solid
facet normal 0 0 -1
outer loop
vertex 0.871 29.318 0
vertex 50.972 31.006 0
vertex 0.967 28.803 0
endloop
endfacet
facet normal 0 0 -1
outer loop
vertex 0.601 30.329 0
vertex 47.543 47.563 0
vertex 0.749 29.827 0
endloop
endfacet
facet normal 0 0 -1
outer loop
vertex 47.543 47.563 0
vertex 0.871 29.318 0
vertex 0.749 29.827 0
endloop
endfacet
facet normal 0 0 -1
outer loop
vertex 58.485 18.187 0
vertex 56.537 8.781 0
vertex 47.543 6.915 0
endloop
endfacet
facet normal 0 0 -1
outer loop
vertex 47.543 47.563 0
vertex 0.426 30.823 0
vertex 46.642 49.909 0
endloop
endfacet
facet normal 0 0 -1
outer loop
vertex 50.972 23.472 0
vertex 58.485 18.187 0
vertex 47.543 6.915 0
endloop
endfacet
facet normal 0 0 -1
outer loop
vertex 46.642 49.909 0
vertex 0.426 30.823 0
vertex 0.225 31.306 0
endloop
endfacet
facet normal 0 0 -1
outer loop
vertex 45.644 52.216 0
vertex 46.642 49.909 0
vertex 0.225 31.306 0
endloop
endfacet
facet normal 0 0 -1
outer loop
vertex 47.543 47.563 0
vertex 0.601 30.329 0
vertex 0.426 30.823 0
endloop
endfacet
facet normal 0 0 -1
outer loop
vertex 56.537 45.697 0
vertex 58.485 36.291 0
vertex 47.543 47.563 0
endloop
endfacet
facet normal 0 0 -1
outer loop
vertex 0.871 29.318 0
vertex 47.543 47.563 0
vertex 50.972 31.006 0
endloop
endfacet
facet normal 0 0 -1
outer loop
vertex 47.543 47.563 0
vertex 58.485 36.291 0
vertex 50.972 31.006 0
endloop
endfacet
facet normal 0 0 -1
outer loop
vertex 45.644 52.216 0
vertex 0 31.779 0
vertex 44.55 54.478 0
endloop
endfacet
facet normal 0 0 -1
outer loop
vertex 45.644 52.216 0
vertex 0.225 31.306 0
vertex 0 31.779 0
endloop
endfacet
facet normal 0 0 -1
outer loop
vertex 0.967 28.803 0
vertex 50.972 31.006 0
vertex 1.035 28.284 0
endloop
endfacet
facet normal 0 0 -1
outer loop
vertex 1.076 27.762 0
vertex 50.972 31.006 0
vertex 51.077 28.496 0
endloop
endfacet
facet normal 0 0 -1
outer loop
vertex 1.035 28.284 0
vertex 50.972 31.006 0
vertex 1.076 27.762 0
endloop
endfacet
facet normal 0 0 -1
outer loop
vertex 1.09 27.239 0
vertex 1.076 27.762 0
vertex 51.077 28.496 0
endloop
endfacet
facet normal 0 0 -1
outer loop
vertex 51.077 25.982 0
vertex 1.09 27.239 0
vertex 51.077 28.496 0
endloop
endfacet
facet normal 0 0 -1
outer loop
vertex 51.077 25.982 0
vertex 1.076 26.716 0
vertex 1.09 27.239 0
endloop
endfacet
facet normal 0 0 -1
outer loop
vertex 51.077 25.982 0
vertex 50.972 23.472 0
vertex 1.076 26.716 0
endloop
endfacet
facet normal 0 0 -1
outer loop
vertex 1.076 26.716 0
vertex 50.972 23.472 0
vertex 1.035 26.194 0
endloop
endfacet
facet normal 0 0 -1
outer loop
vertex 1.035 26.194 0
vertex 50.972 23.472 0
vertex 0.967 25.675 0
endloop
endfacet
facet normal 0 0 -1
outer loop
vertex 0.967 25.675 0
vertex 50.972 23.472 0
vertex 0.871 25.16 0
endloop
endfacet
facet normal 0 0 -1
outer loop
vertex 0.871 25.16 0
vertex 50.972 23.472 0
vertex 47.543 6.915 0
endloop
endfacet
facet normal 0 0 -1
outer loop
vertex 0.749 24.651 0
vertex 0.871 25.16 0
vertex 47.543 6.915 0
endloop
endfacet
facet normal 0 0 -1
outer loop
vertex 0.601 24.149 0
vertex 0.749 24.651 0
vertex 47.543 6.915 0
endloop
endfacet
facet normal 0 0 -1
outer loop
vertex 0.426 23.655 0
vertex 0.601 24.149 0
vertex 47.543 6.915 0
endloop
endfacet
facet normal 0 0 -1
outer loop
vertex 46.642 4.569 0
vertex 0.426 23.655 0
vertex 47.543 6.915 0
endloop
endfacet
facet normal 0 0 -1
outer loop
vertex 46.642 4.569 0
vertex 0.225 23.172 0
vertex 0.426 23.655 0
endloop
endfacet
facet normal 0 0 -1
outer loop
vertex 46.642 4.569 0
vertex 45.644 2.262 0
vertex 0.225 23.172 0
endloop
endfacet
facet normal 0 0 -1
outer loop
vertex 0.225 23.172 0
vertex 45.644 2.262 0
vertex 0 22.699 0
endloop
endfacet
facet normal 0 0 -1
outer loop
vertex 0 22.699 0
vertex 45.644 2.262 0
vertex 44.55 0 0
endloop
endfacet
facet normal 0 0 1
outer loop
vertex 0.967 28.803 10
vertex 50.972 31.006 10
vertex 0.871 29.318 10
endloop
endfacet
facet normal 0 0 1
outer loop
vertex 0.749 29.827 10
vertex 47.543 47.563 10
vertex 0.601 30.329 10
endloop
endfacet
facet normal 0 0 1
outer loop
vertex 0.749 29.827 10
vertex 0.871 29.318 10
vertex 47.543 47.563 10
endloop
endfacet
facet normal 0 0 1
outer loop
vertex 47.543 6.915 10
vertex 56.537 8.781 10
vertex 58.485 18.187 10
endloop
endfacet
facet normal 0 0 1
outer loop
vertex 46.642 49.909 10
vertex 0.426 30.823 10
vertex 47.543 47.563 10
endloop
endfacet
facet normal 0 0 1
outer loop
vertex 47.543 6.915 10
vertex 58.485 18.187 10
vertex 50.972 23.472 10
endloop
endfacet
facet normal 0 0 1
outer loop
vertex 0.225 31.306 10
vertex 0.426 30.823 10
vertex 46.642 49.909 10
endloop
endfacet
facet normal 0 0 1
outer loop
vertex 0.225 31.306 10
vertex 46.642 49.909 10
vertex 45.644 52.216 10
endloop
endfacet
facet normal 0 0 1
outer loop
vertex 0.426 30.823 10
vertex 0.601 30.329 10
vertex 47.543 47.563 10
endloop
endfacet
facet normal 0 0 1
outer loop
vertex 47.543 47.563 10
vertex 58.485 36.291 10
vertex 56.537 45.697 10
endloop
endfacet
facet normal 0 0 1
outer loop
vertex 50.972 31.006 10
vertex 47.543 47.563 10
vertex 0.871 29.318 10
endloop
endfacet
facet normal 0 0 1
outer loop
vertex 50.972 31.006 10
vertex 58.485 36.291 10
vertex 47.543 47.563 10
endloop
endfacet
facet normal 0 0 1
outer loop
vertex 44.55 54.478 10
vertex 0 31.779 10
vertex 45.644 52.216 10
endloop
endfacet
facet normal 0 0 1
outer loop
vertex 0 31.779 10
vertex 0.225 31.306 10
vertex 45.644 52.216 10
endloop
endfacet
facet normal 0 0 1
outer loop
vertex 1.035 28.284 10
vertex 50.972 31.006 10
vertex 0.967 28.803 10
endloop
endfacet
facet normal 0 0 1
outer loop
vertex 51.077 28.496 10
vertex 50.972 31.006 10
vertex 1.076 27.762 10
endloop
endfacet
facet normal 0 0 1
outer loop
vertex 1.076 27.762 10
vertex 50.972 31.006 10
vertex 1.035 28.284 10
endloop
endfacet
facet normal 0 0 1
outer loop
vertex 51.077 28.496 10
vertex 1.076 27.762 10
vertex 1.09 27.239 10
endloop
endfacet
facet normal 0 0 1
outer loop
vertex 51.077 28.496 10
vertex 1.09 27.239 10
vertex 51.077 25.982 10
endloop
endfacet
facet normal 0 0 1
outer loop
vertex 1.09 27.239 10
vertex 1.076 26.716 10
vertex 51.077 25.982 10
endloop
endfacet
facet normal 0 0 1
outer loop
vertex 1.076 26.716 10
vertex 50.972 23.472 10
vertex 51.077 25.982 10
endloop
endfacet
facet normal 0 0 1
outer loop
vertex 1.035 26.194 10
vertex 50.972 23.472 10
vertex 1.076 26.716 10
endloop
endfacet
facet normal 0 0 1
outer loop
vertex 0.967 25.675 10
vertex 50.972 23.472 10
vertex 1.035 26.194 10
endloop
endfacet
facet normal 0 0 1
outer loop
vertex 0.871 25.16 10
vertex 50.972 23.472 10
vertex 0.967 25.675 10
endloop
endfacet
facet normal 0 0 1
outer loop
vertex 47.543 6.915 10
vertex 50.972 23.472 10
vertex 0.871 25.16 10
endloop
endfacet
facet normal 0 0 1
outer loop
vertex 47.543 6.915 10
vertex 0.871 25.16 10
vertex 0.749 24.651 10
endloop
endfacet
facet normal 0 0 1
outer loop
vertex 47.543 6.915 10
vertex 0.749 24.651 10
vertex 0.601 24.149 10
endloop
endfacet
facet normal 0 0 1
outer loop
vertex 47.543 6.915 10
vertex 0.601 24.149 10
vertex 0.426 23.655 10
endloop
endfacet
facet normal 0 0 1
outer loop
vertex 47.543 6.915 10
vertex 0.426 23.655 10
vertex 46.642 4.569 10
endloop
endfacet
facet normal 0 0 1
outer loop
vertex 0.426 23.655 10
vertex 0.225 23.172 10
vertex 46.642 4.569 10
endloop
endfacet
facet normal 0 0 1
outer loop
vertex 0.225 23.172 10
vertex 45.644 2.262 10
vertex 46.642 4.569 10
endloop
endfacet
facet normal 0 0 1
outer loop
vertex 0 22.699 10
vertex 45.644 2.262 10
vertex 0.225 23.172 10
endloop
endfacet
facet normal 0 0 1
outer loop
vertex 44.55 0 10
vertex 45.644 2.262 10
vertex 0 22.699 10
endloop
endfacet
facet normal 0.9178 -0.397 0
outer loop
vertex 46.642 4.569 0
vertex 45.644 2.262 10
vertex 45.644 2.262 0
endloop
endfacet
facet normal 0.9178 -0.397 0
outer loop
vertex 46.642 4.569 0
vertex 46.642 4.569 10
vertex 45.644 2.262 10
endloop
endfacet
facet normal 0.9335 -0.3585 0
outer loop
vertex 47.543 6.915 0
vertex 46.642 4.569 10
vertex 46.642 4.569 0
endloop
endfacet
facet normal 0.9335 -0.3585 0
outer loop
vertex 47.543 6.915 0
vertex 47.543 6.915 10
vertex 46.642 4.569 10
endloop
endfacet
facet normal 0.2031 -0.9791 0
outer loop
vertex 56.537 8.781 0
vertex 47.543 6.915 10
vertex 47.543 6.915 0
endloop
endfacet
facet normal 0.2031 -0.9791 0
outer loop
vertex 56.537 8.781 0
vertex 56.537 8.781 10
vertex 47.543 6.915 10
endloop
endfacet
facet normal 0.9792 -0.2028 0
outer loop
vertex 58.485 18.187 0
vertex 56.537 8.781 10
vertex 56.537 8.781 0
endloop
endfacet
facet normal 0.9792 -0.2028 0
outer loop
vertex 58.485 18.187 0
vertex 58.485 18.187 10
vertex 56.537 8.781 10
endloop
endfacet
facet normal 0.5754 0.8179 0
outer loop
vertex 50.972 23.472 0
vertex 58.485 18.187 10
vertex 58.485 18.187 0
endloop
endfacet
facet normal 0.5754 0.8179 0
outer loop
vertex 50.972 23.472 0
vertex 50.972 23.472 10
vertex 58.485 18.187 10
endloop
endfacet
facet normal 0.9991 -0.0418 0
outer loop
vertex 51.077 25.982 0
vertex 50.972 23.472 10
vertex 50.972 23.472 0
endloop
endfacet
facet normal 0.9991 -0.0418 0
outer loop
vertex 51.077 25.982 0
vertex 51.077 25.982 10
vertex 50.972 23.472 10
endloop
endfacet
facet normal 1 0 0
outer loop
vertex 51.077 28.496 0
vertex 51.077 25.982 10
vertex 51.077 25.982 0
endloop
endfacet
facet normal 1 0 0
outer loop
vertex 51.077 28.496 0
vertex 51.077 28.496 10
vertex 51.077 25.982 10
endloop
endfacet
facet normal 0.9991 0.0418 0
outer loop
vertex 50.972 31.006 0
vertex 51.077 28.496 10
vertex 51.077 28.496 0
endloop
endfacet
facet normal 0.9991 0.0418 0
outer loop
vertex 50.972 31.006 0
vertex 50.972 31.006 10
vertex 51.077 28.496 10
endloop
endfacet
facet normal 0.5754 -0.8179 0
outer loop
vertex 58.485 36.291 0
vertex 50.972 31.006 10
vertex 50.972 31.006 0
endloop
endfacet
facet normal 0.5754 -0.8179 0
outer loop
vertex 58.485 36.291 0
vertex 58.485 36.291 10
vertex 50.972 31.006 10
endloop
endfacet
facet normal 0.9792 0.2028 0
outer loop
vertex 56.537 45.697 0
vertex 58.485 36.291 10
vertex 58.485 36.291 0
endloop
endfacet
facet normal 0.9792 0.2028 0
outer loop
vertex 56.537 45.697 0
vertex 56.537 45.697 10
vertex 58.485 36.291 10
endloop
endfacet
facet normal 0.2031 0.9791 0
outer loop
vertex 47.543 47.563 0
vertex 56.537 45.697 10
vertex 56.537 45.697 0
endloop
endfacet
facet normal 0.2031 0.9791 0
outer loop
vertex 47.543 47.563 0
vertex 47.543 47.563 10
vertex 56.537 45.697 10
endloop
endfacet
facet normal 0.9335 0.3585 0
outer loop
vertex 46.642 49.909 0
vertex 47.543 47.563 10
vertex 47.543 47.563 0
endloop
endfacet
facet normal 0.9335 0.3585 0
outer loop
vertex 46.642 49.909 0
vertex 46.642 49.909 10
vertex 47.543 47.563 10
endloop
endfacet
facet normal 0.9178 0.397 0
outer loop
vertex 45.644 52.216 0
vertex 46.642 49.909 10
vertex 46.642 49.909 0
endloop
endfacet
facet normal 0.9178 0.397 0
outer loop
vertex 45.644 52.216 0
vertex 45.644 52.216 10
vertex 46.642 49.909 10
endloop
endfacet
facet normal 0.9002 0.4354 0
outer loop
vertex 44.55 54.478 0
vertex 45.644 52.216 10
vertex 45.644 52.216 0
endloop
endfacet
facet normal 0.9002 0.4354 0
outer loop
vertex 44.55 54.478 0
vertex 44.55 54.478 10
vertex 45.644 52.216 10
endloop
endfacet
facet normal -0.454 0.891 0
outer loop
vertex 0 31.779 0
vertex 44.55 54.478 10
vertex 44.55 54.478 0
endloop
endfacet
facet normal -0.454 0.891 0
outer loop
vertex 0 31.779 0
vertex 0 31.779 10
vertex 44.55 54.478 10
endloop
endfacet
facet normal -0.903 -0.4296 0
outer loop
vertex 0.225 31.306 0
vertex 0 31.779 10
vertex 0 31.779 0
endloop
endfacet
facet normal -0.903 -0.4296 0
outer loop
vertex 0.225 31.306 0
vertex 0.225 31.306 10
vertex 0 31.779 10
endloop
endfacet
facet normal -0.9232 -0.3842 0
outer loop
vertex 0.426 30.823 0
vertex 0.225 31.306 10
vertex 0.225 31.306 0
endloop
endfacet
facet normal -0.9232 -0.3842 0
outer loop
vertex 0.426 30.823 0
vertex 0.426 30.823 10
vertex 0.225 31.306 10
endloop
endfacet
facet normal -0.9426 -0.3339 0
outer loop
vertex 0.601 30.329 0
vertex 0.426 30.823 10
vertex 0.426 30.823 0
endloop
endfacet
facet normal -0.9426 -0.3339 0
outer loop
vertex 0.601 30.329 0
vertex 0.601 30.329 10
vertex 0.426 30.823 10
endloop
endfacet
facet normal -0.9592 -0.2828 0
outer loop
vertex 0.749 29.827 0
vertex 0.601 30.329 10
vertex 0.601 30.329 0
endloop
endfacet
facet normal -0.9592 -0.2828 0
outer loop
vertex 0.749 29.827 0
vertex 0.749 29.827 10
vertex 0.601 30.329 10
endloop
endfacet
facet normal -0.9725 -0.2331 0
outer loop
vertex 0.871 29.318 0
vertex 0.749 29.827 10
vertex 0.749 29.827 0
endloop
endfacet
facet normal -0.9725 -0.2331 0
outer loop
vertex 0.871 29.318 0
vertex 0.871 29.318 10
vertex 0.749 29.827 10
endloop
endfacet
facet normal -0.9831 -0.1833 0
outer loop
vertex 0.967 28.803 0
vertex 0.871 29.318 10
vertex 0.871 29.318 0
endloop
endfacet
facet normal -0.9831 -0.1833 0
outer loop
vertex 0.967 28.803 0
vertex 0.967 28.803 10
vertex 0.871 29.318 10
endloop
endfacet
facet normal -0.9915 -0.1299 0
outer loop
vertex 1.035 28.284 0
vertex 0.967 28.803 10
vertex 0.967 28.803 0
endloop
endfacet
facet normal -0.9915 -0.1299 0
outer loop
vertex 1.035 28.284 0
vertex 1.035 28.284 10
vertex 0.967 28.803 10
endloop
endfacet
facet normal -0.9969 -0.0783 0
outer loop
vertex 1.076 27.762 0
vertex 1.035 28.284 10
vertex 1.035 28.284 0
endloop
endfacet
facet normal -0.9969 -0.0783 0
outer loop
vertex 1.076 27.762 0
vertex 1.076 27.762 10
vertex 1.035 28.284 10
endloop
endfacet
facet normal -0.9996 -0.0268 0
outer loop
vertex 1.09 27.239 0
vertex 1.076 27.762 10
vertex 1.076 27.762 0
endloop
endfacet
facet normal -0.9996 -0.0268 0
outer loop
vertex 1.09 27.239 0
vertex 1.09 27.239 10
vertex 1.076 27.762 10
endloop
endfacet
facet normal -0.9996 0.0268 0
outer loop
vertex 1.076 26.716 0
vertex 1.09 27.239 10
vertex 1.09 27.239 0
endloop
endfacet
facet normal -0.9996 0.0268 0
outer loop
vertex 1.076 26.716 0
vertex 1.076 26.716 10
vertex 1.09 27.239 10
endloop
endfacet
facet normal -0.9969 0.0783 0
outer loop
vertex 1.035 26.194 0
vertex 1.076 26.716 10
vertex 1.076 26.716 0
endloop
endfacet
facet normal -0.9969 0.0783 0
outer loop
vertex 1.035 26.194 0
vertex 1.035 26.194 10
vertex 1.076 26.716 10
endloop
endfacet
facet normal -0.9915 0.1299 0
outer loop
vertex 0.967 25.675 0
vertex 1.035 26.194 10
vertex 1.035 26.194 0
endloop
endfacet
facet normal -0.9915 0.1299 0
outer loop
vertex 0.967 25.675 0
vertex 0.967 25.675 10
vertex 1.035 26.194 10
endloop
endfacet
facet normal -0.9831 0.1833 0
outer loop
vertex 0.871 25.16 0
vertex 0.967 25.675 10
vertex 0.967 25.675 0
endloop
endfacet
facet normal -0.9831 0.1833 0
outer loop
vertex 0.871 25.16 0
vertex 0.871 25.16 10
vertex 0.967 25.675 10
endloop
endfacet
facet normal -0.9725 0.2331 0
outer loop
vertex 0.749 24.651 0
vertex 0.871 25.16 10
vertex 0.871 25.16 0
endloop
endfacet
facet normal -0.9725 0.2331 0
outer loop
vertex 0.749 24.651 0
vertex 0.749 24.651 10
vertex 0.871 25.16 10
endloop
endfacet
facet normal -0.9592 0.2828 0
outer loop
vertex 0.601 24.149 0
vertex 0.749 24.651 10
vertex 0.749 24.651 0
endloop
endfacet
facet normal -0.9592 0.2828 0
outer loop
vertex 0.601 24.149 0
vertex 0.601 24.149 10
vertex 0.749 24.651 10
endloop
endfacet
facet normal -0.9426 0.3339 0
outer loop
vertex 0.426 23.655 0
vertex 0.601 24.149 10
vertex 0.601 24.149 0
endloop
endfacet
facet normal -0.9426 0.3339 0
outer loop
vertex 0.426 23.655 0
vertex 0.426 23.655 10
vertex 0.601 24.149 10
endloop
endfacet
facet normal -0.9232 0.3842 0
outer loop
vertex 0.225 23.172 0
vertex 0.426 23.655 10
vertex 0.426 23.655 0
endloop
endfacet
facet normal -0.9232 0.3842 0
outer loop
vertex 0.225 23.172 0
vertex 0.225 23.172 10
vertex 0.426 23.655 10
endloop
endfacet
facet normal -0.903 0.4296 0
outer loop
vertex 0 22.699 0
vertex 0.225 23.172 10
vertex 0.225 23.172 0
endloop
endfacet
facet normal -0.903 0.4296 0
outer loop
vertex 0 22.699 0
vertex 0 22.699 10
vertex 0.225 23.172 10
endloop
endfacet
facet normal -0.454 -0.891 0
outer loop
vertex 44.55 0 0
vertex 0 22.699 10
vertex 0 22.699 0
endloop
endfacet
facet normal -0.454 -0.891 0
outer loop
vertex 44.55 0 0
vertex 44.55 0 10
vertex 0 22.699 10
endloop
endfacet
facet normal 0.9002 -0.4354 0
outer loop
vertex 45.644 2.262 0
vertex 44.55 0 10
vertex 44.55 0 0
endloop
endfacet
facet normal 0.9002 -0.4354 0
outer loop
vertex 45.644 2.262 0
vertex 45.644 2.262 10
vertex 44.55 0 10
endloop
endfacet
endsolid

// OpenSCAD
$fn = 32;

// ----------------------------------------------------------------------
// Gear sector: 2 teeth on 54 degrees
// ----------------------------------------------------------------------

// --- parameters (mm) ---
sector_angle = 54;        // sector angle, degrees
root_r = 60;              // root circle radius
tooth_h = 8;              // tooth height over the root circle
teeth = 2;                // number of teeth on the sector
hub_r = 10;               // hub bore radius
plate_t = 10;             // sector thickness, Z
arc_step = 3;             // sampling step of the root/hub arcs, degrees

tip_r = root_r + tooth_h;  // tip circle radius

profile = [[44.55, 0], [45.644, 2.262], [46.642, 4.569], [47.543, 6.915], [56.537, 8.781], [58.485, 18.187], [50.972, 23.472], [51.077, 25.982], [51.077, 28.496], [50.972, 31.006], [58.485, 36.291], [56.537, 45.697], [47.543, 47.563], [46.642, 49.909], [45.644, 52.216], [44.55, 54.478], [0, 31.779], [0.225, 31.306], [0.426, 30.823], [0.601, 30.329], [0.749, 29.827], [0.871, 29.318], [0.967, 28.803], [1.035, 28.284], [1.076, 27.762], [1.09, 27.239], [1.076, 26.716], [1.035, 26.194], [0.967, 25.675], [0.871, 25.16], [0.749, 24.651], [0.601, 24.149], [0.426, 23.655], [0.225, 23.172], [0, 22.699]];  // primary outline, 35 points, counter clockwise

// --- the one profile operation ---
linear_extrude(height = plate_t) polygon(points = profile);
